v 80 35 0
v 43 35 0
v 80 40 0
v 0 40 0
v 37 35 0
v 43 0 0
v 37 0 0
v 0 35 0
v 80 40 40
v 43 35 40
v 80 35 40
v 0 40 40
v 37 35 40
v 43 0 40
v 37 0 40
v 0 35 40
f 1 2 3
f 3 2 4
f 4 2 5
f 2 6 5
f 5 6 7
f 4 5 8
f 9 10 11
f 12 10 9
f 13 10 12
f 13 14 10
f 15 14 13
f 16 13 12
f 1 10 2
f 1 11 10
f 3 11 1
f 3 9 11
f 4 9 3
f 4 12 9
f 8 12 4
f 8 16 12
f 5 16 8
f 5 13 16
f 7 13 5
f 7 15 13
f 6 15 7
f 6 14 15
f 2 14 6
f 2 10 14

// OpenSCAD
$fn = 32;

// ----------------------------------------------------------------------
// Structural section: tee 80 x 40 mm
// ----------------------------------------------------------------------

// --- parameters (mm) ---
sec_w = 80;               // tee width, X
sec_h = 40;               // tee height, Y
flange_t = 5;             // top flange thickness
web_t = 6;                // web thickness
plate_t = 40;             // cut length, Z (extrusion height)

profile = [[37, 0], [43, 0], [43, 35], [80, 35], [80, 40], [0, 40], [0, 35], [37, 35]];  // primary outline, 8 points, counter clockwise

// --- the one profile operation ---
linear_extrude(height = plate_t) polygon(points = profile);
